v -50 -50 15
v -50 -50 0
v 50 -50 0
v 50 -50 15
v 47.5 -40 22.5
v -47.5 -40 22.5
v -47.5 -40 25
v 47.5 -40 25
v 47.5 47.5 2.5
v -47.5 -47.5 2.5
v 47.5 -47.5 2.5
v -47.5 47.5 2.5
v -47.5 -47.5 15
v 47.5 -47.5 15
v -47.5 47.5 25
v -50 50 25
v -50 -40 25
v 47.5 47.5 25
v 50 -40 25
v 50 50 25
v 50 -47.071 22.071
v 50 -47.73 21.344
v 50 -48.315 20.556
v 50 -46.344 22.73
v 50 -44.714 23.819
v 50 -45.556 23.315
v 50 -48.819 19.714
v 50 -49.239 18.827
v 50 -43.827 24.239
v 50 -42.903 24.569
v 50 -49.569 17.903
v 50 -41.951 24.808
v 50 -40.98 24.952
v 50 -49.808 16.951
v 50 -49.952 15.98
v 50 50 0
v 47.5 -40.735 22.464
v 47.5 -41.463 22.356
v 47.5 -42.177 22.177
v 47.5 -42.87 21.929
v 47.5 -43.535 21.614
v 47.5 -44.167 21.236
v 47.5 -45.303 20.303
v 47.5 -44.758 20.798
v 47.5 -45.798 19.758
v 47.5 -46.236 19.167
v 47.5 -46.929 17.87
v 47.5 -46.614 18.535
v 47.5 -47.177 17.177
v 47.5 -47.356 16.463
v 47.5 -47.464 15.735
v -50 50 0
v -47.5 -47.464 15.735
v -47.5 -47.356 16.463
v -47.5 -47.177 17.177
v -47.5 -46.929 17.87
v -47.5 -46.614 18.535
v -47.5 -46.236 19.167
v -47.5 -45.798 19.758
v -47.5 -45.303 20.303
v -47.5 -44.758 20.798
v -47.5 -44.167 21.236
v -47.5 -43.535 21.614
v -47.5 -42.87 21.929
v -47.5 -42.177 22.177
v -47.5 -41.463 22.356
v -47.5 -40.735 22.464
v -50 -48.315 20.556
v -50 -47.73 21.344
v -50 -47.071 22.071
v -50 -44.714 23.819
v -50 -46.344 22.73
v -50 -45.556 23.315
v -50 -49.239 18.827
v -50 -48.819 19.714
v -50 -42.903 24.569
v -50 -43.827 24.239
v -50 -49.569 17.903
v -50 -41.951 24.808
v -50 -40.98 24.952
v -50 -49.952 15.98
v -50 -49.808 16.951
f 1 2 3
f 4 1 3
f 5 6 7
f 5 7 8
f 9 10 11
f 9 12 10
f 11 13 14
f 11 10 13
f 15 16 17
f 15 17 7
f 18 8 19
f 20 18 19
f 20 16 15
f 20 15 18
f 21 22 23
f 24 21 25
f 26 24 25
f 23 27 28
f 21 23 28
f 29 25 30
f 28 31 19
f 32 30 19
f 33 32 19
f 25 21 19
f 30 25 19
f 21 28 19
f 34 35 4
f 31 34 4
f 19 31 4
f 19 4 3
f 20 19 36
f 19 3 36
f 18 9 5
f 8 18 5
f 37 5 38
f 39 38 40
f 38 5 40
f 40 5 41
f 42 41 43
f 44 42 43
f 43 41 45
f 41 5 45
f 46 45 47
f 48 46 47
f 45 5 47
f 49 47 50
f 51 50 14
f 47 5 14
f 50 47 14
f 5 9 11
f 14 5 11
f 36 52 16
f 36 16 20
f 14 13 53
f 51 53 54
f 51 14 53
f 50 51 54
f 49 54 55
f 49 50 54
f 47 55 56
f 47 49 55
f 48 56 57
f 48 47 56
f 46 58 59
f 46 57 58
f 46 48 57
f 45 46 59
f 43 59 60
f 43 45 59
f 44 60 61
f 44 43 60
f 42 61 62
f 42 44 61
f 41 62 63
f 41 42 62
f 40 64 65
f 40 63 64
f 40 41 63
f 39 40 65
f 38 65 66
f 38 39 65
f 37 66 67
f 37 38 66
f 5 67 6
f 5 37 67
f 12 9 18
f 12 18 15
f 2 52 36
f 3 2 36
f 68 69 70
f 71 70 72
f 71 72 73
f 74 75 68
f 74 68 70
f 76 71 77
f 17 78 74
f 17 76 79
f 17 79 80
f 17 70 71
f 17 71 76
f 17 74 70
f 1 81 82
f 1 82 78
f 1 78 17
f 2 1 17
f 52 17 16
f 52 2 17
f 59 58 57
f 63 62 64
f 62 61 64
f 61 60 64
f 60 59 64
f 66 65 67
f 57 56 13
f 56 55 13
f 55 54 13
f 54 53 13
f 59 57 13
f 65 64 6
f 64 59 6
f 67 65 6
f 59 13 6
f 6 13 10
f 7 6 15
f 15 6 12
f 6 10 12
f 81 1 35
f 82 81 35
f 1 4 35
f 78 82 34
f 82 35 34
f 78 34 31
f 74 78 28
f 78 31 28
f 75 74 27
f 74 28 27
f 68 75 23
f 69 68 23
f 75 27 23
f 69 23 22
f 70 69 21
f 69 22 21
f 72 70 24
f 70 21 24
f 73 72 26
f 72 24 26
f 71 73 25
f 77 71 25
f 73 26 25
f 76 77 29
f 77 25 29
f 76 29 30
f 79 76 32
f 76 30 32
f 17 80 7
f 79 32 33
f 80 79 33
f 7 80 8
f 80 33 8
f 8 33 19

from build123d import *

# Parameters (mm, degrees)
F0_W     = 100
F0_H     = 100
F1_DEPTH = 25
F2_R     = 10
F3_T     = -2.5


# Not quite as in the source:
# - a shell that OpenCascade refuses in one call is made with other operations: the cavity is built on its own and cut out


with BuildPart() as f1:
    # F0 (on Top) → F1 (new body)
    with BuildSketch(Plane.XY):
        Rectangle(F0_W, F0_H)
    extrude(amount=F1_DEPTH)

    # F2
    f2_edges = [f1.edges().sort_by_distance(p)[0] for p in [
        (0, -50, 25),
    ]]
    fillet(f2_edges, radius=F2_R)

    # F3: a shell. OpenCascade refuses it in one call, so the cavity is built on its own and cut out:
    # the body offset inwards by the wall thickness, plus a prism from it out through each open face.
    f3_core = offset(f1.part, amount=F3_T, mode=Mode.PRIVATE)
    f3_exits = [f3_core.faces().sort_by_distance(p)[0] for p in [
        (0, 3.75, 22.5),
    ]]
    add(f3_core, mode=Mode.SUBTRACT)
    extrude(f3_exits, amount=-F3_T, mode=Mode.SUBTRACT)


solid = f1.part
